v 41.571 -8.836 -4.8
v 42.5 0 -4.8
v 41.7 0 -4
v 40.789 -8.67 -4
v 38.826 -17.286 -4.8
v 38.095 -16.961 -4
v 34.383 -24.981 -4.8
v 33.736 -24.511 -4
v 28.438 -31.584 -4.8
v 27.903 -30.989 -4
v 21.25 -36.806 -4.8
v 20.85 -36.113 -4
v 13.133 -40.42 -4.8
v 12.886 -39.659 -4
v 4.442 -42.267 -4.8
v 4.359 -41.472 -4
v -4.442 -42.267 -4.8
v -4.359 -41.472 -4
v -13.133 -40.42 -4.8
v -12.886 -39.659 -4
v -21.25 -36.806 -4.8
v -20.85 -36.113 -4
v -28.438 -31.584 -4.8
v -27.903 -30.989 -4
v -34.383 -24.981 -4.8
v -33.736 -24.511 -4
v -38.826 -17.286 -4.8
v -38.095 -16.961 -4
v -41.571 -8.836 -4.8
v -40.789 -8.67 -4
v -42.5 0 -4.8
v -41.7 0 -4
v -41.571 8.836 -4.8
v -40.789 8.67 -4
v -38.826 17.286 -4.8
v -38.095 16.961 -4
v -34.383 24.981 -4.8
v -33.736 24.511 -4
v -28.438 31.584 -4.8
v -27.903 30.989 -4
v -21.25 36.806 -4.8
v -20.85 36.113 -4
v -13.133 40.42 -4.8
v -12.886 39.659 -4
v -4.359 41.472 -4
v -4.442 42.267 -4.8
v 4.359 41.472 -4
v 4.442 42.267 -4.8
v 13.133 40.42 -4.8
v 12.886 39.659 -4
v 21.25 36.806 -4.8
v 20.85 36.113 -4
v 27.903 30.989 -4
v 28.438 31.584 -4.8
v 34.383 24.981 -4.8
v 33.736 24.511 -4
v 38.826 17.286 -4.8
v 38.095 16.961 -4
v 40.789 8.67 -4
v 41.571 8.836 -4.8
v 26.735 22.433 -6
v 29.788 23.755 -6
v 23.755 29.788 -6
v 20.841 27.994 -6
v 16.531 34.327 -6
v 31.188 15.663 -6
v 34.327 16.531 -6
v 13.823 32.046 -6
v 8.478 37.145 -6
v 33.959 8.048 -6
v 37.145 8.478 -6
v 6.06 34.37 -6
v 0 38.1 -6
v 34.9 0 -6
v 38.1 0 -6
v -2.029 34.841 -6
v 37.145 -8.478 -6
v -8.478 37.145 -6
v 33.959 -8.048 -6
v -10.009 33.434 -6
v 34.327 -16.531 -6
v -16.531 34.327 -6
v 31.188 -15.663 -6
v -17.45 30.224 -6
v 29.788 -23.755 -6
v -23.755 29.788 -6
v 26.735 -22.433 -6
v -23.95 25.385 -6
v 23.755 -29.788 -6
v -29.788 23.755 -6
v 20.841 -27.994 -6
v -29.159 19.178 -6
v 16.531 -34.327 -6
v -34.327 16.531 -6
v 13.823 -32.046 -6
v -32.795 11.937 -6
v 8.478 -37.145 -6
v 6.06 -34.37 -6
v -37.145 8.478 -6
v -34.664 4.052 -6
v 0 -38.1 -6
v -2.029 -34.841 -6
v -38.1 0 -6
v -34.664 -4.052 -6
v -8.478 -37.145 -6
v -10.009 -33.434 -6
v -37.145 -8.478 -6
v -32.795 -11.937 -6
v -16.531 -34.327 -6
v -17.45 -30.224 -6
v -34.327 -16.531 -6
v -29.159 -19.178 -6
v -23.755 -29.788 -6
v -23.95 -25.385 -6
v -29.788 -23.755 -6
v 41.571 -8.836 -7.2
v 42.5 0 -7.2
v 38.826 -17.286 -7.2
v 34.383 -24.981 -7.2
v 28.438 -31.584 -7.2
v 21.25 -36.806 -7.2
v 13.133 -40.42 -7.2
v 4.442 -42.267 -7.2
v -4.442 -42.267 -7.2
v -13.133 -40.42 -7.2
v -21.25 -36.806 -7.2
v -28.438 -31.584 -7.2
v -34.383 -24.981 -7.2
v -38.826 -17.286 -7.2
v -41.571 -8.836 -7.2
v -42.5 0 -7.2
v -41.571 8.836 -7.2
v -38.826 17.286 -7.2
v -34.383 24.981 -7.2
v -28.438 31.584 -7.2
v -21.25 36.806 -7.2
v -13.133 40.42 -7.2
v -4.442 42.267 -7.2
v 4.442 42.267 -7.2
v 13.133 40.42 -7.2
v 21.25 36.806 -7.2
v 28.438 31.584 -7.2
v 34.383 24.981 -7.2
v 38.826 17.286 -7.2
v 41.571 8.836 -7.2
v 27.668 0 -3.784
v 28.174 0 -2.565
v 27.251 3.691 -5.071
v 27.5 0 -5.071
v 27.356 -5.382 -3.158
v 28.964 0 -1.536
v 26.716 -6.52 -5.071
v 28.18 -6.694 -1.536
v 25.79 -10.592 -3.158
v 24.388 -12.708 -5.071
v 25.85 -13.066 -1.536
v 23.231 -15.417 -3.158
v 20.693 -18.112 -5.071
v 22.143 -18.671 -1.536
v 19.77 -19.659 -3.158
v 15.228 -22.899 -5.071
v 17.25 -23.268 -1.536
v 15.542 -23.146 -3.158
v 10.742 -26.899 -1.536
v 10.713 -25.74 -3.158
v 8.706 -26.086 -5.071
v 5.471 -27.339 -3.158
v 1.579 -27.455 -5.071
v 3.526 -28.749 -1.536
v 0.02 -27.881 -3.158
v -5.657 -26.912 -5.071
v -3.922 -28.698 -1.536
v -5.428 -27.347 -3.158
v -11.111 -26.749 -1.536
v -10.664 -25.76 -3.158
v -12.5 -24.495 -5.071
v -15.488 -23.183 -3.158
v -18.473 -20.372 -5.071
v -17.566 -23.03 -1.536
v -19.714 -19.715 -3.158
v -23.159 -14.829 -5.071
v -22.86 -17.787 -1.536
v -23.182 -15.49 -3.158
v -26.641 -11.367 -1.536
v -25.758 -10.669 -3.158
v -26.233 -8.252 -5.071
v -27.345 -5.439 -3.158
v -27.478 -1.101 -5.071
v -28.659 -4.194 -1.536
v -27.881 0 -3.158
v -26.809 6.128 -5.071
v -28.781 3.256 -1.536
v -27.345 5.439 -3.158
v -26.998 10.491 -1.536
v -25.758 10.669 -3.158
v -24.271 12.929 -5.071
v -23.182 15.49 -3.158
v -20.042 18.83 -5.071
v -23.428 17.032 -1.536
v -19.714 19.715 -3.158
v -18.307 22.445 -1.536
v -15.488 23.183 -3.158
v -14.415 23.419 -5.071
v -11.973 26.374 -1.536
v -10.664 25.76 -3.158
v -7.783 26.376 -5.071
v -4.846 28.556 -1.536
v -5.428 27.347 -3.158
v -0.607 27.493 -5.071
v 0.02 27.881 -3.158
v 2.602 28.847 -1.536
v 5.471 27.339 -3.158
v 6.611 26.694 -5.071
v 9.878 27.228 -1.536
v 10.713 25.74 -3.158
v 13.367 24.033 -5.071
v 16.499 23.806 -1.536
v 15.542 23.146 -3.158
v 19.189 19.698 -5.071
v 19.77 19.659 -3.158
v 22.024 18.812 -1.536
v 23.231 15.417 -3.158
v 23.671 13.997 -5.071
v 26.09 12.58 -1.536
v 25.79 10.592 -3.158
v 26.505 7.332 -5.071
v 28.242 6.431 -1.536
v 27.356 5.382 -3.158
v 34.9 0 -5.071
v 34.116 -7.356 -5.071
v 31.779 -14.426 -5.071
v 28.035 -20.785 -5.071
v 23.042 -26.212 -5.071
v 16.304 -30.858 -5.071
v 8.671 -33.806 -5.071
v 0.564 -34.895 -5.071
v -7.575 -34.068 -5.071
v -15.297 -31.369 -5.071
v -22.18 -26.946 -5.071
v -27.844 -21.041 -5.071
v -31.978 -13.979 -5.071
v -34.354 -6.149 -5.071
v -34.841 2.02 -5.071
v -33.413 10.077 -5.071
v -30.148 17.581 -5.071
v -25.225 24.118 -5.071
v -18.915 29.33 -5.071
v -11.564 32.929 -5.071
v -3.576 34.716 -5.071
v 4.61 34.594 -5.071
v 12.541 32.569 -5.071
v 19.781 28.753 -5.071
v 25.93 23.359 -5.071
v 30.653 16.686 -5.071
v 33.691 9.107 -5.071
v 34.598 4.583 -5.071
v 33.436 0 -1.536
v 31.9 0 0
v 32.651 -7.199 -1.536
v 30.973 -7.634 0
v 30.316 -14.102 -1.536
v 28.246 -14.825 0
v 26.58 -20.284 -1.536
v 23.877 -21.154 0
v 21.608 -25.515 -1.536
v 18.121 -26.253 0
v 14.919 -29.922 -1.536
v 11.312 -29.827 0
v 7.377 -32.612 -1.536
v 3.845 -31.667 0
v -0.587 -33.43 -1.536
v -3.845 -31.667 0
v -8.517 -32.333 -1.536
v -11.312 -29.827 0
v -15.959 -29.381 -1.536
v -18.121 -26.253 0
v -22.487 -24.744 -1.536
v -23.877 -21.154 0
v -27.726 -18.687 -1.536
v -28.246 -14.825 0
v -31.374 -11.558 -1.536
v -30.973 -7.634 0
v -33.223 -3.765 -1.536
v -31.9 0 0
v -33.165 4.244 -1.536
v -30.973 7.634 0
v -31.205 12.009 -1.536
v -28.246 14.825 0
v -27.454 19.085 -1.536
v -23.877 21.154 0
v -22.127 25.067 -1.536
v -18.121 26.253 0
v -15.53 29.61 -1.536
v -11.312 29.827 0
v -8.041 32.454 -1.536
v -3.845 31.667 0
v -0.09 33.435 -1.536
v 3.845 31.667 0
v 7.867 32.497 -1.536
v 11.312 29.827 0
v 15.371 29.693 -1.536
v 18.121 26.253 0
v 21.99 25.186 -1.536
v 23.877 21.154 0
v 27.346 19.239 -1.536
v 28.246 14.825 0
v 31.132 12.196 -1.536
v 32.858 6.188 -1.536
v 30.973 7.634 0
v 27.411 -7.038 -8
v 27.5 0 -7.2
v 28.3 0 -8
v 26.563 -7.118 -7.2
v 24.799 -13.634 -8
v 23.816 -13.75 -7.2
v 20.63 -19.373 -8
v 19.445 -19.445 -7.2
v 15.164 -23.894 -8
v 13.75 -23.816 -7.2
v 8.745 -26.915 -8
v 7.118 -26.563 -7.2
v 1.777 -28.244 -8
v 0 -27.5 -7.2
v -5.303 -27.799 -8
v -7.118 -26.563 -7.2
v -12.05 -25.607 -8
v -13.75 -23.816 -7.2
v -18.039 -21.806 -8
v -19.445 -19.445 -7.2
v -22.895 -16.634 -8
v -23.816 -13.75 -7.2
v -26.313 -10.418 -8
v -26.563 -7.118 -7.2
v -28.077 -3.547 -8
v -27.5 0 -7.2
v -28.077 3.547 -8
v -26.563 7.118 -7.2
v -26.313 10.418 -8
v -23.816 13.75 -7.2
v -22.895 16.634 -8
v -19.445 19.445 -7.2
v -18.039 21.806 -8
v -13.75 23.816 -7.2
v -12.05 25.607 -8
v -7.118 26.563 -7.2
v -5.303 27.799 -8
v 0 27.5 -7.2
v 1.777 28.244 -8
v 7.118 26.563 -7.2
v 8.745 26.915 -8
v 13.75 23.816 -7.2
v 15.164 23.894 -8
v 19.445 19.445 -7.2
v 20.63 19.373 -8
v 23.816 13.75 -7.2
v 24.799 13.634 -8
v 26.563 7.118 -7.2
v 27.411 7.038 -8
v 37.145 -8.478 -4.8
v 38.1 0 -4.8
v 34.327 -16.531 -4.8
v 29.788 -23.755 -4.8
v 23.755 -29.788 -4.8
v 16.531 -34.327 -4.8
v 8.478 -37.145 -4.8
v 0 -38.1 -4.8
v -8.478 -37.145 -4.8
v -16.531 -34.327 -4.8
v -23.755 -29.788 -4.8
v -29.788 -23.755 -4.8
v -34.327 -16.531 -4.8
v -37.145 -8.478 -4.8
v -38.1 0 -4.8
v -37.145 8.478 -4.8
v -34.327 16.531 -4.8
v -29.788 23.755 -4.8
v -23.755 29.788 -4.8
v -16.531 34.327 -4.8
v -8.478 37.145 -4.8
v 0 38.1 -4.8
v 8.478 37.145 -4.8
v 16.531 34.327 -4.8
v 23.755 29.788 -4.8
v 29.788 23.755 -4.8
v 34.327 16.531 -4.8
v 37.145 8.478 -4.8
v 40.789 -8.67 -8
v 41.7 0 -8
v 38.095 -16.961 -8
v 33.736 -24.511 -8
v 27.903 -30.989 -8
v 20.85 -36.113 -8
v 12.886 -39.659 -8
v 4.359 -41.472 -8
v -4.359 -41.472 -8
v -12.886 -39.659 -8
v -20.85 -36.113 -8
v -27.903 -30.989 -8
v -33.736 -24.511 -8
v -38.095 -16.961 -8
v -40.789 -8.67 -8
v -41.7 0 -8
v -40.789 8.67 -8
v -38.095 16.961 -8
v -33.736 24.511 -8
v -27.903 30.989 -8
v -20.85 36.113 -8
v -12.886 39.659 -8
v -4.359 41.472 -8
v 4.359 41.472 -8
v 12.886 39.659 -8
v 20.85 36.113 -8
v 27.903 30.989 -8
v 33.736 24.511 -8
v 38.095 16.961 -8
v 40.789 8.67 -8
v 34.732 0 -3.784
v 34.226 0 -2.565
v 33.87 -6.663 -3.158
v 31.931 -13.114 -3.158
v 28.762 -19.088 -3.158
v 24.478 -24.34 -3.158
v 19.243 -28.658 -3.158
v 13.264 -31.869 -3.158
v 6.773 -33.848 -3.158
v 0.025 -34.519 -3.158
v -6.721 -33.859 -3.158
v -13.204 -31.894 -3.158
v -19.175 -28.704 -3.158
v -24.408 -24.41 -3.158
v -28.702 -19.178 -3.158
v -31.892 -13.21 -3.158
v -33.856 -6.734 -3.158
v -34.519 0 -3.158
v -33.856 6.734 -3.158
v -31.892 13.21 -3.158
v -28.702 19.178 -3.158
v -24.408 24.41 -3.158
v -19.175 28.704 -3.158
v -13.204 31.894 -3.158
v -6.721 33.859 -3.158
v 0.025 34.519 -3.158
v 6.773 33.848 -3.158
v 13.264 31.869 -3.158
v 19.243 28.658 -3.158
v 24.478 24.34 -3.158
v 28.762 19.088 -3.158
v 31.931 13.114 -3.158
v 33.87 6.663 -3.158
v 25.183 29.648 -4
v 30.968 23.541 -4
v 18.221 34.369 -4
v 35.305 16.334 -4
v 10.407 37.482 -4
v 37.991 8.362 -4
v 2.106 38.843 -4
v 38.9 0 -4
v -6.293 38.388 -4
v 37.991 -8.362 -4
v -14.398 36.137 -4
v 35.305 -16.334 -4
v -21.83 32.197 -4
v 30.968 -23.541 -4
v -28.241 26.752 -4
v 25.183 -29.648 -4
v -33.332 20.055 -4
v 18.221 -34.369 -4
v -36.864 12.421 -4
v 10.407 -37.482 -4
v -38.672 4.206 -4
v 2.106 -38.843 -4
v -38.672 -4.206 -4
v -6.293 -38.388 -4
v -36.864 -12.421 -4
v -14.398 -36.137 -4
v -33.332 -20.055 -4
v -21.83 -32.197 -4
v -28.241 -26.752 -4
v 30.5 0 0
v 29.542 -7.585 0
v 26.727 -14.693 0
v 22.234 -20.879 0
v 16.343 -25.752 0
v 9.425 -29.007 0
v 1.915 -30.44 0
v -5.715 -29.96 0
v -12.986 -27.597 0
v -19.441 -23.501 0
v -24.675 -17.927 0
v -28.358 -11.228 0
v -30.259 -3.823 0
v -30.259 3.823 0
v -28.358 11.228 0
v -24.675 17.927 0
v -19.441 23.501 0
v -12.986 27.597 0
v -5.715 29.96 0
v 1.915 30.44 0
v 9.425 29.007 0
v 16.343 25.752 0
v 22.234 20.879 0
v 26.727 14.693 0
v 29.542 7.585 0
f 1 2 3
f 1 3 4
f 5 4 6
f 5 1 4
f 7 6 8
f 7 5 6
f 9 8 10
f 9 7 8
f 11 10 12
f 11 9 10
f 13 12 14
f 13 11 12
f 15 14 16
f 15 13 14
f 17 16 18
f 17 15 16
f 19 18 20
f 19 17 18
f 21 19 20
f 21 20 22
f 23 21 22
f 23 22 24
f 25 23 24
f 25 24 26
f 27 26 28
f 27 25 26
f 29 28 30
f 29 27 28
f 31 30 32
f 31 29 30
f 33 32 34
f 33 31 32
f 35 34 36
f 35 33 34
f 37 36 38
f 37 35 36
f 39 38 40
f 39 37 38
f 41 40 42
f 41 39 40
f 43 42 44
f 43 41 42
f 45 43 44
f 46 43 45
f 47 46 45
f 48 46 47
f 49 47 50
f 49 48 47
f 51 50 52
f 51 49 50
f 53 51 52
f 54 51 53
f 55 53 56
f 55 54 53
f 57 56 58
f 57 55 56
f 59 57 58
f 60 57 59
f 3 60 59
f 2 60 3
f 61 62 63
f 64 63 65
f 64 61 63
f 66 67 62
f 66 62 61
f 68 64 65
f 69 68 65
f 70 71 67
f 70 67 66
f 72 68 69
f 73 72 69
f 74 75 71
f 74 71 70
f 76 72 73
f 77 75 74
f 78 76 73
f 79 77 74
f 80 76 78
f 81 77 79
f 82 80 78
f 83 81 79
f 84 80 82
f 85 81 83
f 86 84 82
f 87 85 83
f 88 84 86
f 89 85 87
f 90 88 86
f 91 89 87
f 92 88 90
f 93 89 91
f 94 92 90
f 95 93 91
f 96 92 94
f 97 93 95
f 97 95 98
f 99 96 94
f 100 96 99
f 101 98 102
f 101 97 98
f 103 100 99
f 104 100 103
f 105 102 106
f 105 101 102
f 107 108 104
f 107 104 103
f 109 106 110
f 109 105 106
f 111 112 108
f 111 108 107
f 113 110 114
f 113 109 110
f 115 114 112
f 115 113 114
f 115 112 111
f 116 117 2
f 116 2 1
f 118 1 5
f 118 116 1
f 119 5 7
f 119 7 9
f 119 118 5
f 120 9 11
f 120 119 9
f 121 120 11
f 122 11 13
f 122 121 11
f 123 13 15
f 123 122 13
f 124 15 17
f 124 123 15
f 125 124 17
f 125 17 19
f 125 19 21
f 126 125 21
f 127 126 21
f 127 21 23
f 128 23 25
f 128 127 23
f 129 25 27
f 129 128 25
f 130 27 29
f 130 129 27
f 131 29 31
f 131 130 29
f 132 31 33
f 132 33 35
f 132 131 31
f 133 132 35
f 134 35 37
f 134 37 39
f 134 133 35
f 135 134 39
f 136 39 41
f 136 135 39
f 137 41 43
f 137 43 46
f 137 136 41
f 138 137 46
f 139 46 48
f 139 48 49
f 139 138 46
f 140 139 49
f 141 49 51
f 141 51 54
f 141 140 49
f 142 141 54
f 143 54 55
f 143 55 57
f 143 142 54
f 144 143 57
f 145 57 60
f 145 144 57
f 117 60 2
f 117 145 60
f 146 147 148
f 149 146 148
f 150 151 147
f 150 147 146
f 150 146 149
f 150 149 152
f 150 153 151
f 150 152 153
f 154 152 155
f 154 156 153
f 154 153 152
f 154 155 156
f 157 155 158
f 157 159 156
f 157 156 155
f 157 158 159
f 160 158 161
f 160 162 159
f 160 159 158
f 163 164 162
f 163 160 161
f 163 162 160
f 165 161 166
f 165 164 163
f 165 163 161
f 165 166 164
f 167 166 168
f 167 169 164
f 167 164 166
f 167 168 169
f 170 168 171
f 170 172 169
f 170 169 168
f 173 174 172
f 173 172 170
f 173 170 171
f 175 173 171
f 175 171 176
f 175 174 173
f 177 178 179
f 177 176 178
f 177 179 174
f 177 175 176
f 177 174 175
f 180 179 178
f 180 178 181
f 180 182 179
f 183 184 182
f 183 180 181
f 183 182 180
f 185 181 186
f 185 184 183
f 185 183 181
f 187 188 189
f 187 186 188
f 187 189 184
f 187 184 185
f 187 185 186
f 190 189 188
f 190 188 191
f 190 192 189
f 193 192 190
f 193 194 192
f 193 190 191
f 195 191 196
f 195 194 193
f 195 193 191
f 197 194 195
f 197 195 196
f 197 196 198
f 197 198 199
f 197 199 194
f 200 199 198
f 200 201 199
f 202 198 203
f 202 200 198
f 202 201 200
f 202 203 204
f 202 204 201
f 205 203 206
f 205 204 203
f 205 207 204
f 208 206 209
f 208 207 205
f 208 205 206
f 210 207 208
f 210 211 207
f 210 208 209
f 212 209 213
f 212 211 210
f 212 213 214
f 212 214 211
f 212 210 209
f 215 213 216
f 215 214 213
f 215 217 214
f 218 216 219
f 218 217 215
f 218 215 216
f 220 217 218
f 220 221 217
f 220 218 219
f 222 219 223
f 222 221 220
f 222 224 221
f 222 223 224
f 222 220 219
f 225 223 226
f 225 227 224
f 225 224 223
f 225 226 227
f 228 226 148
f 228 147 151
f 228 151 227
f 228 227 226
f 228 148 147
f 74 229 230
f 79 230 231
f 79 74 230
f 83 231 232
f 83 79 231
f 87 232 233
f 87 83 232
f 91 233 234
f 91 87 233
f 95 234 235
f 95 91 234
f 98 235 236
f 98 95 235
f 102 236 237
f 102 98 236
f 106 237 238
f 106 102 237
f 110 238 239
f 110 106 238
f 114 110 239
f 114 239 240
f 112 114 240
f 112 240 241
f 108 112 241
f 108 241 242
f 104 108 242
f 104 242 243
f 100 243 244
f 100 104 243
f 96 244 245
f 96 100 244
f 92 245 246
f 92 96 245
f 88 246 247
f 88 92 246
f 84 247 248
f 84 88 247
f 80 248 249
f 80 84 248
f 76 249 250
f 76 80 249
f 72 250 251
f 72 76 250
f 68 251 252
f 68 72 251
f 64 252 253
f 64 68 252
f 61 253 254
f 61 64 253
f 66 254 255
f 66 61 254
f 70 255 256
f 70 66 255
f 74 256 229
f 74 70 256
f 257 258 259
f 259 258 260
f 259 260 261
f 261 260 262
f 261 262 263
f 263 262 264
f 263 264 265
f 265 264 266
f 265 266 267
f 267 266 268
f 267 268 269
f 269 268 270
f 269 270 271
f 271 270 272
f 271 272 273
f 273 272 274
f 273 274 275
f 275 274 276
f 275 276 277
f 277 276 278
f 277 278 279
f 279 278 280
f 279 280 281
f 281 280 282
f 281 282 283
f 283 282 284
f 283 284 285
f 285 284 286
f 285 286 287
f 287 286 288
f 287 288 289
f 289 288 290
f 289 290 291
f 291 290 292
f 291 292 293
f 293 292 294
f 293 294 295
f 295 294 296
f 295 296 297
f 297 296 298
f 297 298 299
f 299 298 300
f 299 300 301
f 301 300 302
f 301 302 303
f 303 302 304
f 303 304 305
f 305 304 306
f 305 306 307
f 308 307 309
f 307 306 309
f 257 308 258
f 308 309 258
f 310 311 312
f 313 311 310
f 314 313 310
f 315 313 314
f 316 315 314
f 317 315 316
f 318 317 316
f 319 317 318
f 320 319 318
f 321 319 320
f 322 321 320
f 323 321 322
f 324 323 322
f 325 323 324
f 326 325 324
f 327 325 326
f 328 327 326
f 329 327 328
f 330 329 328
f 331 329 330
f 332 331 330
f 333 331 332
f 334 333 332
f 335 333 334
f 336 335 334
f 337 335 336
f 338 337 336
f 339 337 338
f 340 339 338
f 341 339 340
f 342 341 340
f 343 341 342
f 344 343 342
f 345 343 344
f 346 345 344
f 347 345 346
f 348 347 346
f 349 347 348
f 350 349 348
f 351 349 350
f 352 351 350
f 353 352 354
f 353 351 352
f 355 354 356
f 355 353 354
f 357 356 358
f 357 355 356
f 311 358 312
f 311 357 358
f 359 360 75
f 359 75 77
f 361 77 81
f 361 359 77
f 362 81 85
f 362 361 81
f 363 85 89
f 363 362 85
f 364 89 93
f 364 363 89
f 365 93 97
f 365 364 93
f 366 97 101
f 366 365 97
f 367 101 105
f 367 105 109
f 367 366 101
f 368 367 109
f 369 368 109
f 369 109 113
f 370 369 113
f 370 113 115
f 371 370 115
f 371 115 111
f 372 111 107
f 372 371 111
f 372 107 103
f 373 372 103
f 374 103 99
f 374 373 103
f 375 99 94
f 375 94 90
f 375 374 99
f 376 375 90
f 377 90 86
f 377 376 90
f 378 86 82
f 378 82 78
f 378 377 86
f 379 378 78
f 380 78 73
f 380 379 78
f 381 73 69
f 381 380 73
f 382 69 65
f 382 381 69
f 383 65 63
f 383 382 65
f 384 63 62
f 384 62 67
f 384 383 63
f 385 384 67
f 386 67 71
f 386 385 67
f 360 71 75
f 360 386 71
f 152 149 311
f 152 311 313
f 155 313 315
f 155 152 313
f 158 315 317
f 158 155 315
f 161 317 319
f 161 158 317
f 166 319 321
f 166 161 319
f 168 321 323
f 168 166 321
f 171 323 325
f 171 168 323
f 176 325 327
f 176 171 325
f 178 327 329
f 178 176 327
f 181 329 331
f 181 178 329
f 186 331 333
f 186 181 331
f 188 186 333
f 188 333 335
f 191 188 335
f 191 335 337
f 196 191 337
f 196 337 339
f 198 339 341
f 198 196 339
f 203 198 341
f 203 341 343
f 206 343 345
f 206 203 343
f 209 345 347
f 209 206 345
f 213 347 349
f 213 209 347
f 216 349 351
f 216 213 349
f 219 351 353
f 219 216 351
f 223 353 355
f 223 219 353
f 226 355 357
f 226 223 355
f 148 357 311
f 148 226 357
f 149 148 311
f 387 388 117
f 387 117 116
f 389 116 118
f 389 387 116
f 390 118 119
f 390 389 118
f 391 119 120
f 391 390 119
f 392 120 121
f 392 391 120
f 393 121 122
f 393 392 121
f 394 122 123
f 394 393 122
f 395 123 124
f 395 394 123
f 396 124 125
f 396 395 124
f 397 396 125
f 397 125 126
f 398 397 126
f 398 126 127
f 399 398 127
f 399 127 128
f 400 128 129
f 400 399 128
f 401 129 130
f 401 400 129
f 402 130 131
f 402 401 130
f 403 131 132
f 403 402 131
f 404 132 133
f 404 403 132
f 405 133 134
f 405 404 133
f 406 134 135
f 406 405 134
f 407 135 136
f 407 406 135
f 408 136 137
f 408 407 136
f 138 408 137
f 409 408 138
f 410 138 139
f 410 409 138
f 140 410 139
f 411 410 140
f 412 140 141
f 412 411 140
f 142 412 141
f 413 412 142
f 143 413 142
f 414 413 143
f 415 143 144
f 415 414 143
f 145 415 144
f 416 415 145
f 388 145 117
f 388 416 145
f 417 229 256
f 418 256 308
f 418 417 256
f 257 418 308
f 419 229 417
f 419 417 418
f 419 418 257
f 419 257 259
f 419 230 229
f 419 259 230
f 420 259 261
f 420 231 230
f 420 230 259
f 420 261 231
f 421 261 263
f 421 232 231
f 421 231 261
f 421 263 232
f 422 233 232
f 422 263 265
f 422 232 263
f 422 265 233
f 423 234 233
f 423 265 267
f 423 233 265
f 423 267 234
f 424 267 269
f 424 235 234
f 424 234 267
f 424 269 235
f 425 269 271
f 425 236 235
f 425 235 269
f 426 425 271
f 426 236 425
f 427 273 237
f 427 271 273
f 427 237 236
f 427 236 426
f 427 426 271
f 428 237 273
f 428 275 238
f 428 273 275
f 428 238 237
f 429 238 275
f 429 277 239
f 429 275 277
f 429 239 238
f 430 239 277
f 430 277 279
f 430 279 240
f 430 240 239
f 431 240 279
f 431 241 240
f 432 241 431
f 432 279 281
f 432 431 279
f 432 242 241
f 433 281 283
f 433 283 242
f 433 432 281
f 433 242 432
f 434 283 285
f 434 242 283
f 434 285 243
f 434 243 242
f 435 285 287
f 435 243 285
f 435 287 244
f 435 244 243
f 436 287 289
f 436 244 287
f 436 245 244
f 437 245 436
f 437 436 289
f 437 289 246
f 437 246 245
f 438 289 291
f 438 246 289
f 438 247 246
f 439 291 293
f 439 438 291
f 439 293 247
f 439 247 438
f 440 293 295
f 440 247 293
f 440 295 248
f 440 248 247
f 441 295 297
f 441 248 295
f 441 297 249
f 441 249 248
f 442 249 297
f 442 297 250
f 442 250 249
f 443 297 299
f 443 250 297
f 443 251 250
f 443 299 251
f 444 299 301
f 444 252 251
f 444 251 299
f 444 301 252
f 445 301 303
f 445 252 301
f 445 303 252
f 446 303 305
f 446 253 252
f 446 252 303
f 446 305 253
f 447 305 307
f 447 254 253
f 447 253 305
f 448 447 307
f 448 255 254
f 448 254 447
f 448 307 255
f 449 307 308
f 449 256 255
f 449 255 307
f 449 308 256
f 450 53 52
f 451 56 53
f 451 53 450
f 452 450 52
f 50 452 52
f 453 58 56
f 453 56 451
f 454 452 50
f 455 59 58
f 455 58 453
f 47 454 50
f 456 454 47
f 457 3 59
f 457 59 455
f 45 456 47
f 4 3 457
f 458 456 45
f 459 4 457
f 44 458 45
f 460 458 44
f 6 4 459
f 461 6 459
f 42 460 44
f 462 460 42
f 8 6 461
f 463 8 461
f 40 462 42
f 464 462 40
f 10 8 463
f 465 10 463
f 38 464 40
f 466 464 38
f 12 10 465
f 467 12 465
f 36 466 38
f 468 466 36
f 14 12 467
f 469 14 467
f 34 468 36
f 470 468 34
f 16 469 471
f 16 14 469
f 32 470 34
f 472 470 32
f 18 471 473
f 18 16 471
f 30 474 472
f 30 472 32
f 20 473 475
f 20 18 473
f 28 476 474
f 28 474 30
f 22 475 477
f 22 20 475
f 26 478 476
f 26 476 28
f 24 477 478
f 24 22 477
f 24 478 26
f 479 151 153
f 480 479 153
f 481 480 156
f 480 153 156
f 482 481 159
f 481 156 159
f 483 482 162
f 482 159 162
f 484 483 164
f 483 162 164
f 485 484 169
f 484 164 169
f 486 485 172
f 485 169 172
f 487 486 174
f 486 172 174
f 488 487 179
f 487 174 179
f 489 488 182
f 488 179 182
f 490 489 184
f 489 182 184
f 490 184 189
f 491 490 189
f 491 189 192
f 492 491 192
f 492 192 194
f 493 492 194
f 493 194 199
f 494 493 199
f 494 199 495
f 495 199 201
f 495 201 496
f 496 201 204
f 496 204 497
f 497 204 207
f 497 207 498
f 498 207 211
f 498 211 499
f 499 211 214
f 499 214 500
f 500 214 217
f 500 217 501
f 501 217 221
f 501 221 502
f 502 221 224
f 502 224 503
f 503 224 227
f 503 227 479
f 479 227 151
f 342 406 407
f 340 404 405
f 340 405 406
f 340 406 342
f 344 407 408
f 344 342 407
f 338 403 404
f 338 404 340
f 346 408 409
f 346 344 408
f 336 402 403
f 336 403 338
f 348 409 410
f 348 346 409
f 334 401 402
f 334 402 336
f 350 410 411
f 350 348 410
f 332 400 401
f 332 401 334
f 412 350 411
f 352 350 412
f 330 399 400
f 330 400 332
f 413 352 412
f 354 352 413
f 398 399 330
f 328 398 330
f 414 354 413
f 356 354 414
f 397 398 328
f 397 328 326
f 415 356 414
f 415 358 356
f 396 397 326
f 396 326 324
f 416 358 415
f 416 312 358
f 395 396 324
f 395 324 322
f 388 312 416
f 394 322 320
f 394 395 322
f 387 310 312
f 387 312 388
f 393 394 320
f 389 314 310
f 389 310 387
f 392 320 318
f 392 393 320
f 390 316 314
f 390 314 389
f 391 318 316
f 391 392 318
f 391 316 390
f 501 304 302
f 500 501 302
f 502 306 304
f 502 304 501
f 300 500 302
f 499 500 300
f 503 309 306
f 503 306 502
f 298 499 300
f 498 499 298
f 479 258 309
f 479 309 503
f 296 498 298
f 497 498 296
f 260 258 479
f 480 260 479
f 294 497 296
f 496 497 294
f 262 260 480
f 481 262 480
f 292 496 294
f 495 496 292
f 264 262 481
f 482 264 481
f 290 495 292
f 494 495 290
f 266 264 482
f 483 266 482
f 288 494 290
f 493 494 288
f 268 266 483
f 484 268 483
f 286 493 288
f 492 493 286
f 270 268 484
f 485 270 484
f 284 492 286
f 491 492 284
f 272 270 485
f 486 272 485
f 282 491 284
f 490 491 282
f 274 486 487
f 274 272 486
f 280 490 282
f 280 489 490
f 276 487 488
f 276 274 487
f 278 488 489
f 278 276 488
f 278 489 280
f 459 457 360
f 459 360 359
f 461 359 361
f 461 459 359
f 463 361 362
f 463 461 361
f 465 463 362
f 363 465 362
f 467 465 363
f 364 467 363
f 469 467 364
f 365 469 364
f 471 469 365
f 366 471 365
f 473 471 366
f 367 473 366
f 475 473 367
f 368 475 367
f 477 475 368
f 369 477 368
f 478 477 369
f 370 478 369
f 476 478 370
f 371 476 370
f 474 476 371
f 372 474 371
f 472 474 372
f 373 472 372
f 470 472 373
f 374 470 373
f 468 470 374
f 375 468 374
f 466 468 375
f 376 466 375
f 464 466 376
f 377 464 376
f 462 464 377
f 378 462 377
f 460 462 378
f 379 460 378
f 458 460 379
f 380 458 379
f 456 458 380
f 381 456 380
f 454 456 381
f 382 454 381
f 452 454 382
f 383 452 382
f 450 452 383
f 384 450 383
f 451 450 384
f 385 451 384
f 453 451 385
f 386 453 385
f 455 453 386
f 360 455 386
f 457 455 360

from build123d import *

# Parameters (mm, degrees)
FASE1_SIZE    = 0.8
FASE2_SIZE    = 3
VERRUNDUNG1_R = 5


with BuildPart() as part:
    # Skizze3 → Rotation1 (revolve)
    with BuildSketch(Plane(origin=(0, 0, 0), x_dir=(0, 0, -1), z_dir=(1, 0, 0)), mode=Mode.PRIVATE) as rotation1_sk:
        Polygon((0, 27.5), (0, 34.9), (6, 34.9), (6, 38.1), (4, 38.1), (4, 42.5), (8, 42.5), (8, 27.5), align=None)
    revolve(rotation1_sk.sketch.rotate(Axis((0, 0, 28.082191781), (0, 0, -1)), 90), axis=Axis((0, 0, 28.082191781), (0, 0, -1)))

    # Fase1
    fase1_edges = [part.edges().sort_by_distance(p)[0] for p in [
        (-27.5, 0, -8),
        (-42.5, 0, -8),
        (-42.5, 0, -4),
        (-38.1, 0, -4),
    ]]
    chamfer(fase1_edges, length=FASE1_SIZE)

    # Fase2
    fase2_edges = [part.edges().sort_by_distance(p)[0] for p in [
        (-27.5, 0, 0),
        (-34.9, 0, 0),
    ]]
    chamfer(fase2_edges, length=FASE2_SIZE)

    # Verrundung1
    verrundung1_edges = [part.edges().sort_by_distance(p)[0] for p in [
        (-34.9, 0, -3),
        (-27.5, 0, -3),
    ]]
    fillet(verrundung1_edges, radius=VERRUNDUNG1_R)


solid = part.part
